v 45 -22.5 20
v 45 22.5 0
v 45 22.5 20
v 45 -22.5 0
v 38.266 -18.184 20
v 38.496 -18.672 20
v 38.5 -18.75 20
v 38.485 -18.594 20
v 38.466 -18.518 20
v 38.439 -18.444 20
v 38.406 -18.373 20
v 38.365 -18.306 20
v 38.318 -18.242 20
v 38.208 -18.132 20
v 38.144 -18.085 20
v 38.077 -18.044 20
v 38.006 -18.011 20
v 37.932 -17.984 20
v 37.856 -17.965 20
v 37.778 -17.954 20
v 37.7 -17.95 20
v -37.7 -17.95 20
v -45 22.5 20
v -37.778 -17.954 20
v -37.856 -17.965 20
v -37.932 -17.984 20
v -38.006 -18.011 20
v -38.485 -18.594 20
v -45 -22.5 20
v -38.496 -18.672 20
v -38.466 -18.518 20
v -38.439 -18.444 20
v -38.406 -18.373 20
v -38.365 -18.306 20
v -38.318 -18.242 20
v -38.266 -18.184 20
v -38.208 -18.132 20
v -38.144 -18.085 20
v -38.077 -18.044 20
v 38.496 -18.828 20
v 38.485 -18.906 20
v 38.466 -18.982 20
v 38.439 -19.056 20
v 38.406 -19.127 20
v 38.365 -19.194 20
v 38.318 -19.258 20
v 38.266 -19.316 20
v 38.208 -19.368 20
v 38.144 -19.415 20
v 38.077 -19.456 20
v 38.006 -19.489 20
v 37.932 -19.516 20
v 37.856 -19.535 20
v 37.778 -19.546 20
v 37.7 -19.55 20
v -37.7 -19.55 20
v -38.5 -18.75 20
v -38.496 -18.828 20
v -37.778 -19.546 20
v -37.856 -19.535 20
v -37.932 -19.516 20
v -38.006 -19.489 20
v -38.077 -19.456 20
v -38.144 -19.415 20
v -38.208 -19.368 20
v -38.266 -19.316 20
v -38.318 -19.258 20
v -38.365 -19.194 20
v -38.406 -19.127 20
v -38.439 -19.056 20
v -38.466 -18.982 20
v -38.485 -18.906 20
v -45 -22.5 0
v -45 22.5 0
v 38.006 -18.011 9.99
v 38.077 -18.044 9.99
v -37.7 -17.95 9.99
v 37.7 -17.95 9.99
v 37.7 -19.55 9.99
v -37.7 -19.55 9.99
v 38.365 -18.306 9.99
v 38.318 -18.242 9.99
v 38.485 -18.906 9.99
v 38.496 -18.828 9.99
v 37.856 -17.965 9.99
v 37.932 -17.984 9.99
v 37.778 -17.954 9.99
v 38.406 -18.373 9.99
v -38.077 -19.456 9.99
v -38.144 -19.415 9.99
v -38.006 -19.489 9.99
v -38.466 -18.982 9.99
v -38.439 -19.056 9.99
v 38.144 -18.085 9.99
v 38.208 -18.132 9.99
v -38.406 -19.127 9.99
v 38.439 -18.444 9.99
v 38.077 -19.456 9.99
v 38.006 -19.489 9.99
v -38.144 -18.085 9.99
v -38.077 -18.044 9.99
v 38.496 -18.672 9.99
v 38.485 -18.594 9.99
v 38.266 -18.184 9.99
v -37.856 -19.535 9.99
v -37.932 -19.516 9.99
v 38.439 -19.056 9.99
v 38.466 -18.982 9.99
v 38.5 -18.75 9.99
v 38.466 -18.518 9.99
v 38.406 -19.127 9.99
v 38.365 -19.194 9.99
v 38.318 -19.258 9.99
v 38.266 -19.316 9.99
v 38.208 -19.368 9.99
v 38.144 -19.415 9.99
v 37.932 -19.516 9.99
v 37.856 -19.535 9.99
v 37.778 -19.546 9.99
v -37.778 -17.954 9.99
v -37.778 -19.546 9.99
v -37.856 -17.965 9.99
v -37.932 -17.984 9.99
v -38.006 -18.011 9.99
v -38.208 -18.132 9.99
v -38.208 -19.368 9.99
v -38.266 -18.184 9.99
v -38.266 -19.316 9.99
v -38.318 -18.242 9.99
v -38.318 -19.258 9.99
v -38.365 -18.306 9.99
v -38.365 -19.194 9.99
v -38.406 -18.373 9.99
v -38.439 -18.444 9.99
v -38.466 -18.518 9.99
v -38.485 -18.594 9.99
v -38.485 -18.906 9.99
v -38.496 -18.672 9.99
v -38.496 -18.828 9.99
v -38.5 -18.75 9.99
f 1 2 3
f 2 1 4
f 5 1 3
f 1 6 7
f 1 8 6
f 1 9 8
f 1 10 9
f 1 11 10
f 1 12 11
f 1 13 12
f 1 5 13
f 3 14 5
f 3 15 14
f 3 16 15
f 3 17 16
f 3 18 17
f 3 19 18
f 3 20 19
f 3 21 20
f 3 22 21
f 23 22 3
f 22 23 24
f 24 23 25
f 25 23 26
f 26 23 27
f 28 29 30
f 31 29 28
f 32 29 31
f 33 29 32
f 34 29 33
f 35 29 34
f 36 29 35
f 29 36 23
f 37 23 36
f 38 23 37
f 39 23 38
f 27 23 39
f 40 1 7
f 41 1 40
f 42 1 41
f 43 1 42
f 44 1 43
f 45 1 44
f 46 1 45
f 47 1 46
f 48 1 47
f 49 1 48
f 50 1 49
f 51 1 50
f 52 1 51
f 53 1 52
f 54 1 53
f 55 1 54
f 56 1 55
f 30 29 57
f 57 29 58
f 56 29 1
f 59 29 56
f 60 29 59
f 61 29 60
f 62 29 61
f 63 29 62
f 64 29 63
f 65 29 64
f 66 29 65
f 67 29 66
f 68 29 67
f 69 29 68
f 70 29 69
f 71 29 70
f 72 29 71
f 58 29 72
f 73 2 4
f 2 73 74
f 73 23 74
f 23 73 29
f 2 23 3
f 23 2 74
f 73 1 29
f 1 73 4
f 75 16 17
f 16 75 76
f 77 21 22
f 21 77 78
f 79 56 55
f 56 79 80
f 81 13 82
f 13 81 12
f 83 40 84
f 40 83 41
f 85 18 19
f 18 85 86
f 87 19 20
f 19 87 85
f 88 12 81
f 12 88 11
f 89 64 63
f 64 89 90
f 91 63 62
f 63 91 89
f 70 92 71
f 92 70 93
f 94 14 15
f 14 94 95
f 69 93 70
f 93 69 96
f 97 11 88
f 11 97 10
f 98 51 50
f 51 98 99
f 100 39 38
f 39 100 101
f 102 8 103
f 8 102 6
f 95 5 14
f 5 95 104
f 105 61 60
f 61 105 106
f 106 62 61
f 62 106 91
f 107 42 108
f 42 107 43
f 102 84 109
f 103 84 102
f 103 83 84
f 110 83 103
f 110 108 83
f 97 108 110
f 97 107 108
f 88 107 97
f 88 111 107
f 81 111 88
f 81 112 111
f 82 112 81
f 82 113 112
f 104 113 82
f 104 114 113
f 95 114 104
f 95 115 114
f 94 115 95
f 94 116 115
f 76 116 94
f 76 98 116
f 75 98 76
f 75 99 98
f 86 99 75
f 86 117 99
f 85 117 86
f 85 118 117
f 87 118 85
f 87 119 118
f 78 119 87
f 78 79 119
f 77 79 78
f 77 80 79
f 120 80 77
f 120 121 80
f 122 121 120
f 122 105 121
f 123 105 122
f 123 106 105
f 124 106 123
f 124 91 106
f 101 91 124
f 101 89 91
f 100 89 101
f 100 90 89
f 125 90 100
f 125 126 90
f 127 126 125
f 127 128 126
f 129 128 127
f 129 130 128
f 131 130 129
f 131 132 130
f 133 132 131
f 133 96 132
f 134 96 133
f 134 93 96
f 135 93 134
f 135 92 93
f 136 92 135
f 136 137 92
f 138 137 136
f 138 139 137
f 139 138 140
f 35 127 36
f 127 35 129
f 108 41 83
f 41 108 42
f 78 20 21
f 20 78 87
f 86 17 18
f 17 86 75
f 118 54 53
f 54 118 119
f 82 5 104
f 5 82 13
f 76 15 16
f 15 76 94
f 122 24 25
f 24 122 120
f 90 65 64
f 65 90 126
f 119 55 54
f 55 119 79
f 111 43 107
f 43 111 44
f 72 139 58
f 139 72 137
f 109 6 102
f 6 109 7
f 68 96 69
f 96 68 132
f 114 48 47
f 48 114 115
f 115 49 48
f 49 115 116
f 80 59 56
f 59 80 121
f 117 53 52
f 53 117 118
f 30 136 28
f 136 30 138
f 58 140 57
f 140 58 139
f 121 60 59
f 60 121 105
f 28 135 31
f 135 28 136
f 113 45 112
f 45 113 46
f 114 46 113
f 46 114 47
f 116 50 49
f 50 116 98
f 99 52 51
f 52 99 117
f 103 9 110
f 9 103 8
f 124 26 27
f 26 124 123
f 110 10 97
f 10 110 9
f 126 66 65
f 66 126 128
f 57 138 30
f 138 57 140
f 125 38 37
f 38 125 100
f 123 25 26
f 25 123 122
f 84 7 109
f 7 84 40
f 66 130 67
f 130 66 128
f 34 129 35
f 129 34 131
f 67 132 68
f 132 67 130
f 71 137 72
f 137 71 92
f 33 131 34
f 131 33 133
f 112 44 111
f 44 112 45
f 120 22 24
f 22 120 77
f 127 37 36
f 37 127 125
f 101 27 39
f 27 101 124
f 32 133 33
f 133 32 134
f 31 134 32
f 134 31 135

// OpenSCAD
// Built by bench/smallmodels/features/compiler.py from a list of features.
$fn = 64;
difference() {
  union() {
    translate([0, 0, 0]) translate([-45, -22.5, 0]) cube([90, 45, 20]);
  }
  union() {
    translate([0, -18.75, 9.99]) rotate([0, 0, 0]) hull() { for (s = [-1, 1]) translate([s * 37.7, 0, 0]) cylinder(d = 1.6, h = 10.02); }
  }
}
